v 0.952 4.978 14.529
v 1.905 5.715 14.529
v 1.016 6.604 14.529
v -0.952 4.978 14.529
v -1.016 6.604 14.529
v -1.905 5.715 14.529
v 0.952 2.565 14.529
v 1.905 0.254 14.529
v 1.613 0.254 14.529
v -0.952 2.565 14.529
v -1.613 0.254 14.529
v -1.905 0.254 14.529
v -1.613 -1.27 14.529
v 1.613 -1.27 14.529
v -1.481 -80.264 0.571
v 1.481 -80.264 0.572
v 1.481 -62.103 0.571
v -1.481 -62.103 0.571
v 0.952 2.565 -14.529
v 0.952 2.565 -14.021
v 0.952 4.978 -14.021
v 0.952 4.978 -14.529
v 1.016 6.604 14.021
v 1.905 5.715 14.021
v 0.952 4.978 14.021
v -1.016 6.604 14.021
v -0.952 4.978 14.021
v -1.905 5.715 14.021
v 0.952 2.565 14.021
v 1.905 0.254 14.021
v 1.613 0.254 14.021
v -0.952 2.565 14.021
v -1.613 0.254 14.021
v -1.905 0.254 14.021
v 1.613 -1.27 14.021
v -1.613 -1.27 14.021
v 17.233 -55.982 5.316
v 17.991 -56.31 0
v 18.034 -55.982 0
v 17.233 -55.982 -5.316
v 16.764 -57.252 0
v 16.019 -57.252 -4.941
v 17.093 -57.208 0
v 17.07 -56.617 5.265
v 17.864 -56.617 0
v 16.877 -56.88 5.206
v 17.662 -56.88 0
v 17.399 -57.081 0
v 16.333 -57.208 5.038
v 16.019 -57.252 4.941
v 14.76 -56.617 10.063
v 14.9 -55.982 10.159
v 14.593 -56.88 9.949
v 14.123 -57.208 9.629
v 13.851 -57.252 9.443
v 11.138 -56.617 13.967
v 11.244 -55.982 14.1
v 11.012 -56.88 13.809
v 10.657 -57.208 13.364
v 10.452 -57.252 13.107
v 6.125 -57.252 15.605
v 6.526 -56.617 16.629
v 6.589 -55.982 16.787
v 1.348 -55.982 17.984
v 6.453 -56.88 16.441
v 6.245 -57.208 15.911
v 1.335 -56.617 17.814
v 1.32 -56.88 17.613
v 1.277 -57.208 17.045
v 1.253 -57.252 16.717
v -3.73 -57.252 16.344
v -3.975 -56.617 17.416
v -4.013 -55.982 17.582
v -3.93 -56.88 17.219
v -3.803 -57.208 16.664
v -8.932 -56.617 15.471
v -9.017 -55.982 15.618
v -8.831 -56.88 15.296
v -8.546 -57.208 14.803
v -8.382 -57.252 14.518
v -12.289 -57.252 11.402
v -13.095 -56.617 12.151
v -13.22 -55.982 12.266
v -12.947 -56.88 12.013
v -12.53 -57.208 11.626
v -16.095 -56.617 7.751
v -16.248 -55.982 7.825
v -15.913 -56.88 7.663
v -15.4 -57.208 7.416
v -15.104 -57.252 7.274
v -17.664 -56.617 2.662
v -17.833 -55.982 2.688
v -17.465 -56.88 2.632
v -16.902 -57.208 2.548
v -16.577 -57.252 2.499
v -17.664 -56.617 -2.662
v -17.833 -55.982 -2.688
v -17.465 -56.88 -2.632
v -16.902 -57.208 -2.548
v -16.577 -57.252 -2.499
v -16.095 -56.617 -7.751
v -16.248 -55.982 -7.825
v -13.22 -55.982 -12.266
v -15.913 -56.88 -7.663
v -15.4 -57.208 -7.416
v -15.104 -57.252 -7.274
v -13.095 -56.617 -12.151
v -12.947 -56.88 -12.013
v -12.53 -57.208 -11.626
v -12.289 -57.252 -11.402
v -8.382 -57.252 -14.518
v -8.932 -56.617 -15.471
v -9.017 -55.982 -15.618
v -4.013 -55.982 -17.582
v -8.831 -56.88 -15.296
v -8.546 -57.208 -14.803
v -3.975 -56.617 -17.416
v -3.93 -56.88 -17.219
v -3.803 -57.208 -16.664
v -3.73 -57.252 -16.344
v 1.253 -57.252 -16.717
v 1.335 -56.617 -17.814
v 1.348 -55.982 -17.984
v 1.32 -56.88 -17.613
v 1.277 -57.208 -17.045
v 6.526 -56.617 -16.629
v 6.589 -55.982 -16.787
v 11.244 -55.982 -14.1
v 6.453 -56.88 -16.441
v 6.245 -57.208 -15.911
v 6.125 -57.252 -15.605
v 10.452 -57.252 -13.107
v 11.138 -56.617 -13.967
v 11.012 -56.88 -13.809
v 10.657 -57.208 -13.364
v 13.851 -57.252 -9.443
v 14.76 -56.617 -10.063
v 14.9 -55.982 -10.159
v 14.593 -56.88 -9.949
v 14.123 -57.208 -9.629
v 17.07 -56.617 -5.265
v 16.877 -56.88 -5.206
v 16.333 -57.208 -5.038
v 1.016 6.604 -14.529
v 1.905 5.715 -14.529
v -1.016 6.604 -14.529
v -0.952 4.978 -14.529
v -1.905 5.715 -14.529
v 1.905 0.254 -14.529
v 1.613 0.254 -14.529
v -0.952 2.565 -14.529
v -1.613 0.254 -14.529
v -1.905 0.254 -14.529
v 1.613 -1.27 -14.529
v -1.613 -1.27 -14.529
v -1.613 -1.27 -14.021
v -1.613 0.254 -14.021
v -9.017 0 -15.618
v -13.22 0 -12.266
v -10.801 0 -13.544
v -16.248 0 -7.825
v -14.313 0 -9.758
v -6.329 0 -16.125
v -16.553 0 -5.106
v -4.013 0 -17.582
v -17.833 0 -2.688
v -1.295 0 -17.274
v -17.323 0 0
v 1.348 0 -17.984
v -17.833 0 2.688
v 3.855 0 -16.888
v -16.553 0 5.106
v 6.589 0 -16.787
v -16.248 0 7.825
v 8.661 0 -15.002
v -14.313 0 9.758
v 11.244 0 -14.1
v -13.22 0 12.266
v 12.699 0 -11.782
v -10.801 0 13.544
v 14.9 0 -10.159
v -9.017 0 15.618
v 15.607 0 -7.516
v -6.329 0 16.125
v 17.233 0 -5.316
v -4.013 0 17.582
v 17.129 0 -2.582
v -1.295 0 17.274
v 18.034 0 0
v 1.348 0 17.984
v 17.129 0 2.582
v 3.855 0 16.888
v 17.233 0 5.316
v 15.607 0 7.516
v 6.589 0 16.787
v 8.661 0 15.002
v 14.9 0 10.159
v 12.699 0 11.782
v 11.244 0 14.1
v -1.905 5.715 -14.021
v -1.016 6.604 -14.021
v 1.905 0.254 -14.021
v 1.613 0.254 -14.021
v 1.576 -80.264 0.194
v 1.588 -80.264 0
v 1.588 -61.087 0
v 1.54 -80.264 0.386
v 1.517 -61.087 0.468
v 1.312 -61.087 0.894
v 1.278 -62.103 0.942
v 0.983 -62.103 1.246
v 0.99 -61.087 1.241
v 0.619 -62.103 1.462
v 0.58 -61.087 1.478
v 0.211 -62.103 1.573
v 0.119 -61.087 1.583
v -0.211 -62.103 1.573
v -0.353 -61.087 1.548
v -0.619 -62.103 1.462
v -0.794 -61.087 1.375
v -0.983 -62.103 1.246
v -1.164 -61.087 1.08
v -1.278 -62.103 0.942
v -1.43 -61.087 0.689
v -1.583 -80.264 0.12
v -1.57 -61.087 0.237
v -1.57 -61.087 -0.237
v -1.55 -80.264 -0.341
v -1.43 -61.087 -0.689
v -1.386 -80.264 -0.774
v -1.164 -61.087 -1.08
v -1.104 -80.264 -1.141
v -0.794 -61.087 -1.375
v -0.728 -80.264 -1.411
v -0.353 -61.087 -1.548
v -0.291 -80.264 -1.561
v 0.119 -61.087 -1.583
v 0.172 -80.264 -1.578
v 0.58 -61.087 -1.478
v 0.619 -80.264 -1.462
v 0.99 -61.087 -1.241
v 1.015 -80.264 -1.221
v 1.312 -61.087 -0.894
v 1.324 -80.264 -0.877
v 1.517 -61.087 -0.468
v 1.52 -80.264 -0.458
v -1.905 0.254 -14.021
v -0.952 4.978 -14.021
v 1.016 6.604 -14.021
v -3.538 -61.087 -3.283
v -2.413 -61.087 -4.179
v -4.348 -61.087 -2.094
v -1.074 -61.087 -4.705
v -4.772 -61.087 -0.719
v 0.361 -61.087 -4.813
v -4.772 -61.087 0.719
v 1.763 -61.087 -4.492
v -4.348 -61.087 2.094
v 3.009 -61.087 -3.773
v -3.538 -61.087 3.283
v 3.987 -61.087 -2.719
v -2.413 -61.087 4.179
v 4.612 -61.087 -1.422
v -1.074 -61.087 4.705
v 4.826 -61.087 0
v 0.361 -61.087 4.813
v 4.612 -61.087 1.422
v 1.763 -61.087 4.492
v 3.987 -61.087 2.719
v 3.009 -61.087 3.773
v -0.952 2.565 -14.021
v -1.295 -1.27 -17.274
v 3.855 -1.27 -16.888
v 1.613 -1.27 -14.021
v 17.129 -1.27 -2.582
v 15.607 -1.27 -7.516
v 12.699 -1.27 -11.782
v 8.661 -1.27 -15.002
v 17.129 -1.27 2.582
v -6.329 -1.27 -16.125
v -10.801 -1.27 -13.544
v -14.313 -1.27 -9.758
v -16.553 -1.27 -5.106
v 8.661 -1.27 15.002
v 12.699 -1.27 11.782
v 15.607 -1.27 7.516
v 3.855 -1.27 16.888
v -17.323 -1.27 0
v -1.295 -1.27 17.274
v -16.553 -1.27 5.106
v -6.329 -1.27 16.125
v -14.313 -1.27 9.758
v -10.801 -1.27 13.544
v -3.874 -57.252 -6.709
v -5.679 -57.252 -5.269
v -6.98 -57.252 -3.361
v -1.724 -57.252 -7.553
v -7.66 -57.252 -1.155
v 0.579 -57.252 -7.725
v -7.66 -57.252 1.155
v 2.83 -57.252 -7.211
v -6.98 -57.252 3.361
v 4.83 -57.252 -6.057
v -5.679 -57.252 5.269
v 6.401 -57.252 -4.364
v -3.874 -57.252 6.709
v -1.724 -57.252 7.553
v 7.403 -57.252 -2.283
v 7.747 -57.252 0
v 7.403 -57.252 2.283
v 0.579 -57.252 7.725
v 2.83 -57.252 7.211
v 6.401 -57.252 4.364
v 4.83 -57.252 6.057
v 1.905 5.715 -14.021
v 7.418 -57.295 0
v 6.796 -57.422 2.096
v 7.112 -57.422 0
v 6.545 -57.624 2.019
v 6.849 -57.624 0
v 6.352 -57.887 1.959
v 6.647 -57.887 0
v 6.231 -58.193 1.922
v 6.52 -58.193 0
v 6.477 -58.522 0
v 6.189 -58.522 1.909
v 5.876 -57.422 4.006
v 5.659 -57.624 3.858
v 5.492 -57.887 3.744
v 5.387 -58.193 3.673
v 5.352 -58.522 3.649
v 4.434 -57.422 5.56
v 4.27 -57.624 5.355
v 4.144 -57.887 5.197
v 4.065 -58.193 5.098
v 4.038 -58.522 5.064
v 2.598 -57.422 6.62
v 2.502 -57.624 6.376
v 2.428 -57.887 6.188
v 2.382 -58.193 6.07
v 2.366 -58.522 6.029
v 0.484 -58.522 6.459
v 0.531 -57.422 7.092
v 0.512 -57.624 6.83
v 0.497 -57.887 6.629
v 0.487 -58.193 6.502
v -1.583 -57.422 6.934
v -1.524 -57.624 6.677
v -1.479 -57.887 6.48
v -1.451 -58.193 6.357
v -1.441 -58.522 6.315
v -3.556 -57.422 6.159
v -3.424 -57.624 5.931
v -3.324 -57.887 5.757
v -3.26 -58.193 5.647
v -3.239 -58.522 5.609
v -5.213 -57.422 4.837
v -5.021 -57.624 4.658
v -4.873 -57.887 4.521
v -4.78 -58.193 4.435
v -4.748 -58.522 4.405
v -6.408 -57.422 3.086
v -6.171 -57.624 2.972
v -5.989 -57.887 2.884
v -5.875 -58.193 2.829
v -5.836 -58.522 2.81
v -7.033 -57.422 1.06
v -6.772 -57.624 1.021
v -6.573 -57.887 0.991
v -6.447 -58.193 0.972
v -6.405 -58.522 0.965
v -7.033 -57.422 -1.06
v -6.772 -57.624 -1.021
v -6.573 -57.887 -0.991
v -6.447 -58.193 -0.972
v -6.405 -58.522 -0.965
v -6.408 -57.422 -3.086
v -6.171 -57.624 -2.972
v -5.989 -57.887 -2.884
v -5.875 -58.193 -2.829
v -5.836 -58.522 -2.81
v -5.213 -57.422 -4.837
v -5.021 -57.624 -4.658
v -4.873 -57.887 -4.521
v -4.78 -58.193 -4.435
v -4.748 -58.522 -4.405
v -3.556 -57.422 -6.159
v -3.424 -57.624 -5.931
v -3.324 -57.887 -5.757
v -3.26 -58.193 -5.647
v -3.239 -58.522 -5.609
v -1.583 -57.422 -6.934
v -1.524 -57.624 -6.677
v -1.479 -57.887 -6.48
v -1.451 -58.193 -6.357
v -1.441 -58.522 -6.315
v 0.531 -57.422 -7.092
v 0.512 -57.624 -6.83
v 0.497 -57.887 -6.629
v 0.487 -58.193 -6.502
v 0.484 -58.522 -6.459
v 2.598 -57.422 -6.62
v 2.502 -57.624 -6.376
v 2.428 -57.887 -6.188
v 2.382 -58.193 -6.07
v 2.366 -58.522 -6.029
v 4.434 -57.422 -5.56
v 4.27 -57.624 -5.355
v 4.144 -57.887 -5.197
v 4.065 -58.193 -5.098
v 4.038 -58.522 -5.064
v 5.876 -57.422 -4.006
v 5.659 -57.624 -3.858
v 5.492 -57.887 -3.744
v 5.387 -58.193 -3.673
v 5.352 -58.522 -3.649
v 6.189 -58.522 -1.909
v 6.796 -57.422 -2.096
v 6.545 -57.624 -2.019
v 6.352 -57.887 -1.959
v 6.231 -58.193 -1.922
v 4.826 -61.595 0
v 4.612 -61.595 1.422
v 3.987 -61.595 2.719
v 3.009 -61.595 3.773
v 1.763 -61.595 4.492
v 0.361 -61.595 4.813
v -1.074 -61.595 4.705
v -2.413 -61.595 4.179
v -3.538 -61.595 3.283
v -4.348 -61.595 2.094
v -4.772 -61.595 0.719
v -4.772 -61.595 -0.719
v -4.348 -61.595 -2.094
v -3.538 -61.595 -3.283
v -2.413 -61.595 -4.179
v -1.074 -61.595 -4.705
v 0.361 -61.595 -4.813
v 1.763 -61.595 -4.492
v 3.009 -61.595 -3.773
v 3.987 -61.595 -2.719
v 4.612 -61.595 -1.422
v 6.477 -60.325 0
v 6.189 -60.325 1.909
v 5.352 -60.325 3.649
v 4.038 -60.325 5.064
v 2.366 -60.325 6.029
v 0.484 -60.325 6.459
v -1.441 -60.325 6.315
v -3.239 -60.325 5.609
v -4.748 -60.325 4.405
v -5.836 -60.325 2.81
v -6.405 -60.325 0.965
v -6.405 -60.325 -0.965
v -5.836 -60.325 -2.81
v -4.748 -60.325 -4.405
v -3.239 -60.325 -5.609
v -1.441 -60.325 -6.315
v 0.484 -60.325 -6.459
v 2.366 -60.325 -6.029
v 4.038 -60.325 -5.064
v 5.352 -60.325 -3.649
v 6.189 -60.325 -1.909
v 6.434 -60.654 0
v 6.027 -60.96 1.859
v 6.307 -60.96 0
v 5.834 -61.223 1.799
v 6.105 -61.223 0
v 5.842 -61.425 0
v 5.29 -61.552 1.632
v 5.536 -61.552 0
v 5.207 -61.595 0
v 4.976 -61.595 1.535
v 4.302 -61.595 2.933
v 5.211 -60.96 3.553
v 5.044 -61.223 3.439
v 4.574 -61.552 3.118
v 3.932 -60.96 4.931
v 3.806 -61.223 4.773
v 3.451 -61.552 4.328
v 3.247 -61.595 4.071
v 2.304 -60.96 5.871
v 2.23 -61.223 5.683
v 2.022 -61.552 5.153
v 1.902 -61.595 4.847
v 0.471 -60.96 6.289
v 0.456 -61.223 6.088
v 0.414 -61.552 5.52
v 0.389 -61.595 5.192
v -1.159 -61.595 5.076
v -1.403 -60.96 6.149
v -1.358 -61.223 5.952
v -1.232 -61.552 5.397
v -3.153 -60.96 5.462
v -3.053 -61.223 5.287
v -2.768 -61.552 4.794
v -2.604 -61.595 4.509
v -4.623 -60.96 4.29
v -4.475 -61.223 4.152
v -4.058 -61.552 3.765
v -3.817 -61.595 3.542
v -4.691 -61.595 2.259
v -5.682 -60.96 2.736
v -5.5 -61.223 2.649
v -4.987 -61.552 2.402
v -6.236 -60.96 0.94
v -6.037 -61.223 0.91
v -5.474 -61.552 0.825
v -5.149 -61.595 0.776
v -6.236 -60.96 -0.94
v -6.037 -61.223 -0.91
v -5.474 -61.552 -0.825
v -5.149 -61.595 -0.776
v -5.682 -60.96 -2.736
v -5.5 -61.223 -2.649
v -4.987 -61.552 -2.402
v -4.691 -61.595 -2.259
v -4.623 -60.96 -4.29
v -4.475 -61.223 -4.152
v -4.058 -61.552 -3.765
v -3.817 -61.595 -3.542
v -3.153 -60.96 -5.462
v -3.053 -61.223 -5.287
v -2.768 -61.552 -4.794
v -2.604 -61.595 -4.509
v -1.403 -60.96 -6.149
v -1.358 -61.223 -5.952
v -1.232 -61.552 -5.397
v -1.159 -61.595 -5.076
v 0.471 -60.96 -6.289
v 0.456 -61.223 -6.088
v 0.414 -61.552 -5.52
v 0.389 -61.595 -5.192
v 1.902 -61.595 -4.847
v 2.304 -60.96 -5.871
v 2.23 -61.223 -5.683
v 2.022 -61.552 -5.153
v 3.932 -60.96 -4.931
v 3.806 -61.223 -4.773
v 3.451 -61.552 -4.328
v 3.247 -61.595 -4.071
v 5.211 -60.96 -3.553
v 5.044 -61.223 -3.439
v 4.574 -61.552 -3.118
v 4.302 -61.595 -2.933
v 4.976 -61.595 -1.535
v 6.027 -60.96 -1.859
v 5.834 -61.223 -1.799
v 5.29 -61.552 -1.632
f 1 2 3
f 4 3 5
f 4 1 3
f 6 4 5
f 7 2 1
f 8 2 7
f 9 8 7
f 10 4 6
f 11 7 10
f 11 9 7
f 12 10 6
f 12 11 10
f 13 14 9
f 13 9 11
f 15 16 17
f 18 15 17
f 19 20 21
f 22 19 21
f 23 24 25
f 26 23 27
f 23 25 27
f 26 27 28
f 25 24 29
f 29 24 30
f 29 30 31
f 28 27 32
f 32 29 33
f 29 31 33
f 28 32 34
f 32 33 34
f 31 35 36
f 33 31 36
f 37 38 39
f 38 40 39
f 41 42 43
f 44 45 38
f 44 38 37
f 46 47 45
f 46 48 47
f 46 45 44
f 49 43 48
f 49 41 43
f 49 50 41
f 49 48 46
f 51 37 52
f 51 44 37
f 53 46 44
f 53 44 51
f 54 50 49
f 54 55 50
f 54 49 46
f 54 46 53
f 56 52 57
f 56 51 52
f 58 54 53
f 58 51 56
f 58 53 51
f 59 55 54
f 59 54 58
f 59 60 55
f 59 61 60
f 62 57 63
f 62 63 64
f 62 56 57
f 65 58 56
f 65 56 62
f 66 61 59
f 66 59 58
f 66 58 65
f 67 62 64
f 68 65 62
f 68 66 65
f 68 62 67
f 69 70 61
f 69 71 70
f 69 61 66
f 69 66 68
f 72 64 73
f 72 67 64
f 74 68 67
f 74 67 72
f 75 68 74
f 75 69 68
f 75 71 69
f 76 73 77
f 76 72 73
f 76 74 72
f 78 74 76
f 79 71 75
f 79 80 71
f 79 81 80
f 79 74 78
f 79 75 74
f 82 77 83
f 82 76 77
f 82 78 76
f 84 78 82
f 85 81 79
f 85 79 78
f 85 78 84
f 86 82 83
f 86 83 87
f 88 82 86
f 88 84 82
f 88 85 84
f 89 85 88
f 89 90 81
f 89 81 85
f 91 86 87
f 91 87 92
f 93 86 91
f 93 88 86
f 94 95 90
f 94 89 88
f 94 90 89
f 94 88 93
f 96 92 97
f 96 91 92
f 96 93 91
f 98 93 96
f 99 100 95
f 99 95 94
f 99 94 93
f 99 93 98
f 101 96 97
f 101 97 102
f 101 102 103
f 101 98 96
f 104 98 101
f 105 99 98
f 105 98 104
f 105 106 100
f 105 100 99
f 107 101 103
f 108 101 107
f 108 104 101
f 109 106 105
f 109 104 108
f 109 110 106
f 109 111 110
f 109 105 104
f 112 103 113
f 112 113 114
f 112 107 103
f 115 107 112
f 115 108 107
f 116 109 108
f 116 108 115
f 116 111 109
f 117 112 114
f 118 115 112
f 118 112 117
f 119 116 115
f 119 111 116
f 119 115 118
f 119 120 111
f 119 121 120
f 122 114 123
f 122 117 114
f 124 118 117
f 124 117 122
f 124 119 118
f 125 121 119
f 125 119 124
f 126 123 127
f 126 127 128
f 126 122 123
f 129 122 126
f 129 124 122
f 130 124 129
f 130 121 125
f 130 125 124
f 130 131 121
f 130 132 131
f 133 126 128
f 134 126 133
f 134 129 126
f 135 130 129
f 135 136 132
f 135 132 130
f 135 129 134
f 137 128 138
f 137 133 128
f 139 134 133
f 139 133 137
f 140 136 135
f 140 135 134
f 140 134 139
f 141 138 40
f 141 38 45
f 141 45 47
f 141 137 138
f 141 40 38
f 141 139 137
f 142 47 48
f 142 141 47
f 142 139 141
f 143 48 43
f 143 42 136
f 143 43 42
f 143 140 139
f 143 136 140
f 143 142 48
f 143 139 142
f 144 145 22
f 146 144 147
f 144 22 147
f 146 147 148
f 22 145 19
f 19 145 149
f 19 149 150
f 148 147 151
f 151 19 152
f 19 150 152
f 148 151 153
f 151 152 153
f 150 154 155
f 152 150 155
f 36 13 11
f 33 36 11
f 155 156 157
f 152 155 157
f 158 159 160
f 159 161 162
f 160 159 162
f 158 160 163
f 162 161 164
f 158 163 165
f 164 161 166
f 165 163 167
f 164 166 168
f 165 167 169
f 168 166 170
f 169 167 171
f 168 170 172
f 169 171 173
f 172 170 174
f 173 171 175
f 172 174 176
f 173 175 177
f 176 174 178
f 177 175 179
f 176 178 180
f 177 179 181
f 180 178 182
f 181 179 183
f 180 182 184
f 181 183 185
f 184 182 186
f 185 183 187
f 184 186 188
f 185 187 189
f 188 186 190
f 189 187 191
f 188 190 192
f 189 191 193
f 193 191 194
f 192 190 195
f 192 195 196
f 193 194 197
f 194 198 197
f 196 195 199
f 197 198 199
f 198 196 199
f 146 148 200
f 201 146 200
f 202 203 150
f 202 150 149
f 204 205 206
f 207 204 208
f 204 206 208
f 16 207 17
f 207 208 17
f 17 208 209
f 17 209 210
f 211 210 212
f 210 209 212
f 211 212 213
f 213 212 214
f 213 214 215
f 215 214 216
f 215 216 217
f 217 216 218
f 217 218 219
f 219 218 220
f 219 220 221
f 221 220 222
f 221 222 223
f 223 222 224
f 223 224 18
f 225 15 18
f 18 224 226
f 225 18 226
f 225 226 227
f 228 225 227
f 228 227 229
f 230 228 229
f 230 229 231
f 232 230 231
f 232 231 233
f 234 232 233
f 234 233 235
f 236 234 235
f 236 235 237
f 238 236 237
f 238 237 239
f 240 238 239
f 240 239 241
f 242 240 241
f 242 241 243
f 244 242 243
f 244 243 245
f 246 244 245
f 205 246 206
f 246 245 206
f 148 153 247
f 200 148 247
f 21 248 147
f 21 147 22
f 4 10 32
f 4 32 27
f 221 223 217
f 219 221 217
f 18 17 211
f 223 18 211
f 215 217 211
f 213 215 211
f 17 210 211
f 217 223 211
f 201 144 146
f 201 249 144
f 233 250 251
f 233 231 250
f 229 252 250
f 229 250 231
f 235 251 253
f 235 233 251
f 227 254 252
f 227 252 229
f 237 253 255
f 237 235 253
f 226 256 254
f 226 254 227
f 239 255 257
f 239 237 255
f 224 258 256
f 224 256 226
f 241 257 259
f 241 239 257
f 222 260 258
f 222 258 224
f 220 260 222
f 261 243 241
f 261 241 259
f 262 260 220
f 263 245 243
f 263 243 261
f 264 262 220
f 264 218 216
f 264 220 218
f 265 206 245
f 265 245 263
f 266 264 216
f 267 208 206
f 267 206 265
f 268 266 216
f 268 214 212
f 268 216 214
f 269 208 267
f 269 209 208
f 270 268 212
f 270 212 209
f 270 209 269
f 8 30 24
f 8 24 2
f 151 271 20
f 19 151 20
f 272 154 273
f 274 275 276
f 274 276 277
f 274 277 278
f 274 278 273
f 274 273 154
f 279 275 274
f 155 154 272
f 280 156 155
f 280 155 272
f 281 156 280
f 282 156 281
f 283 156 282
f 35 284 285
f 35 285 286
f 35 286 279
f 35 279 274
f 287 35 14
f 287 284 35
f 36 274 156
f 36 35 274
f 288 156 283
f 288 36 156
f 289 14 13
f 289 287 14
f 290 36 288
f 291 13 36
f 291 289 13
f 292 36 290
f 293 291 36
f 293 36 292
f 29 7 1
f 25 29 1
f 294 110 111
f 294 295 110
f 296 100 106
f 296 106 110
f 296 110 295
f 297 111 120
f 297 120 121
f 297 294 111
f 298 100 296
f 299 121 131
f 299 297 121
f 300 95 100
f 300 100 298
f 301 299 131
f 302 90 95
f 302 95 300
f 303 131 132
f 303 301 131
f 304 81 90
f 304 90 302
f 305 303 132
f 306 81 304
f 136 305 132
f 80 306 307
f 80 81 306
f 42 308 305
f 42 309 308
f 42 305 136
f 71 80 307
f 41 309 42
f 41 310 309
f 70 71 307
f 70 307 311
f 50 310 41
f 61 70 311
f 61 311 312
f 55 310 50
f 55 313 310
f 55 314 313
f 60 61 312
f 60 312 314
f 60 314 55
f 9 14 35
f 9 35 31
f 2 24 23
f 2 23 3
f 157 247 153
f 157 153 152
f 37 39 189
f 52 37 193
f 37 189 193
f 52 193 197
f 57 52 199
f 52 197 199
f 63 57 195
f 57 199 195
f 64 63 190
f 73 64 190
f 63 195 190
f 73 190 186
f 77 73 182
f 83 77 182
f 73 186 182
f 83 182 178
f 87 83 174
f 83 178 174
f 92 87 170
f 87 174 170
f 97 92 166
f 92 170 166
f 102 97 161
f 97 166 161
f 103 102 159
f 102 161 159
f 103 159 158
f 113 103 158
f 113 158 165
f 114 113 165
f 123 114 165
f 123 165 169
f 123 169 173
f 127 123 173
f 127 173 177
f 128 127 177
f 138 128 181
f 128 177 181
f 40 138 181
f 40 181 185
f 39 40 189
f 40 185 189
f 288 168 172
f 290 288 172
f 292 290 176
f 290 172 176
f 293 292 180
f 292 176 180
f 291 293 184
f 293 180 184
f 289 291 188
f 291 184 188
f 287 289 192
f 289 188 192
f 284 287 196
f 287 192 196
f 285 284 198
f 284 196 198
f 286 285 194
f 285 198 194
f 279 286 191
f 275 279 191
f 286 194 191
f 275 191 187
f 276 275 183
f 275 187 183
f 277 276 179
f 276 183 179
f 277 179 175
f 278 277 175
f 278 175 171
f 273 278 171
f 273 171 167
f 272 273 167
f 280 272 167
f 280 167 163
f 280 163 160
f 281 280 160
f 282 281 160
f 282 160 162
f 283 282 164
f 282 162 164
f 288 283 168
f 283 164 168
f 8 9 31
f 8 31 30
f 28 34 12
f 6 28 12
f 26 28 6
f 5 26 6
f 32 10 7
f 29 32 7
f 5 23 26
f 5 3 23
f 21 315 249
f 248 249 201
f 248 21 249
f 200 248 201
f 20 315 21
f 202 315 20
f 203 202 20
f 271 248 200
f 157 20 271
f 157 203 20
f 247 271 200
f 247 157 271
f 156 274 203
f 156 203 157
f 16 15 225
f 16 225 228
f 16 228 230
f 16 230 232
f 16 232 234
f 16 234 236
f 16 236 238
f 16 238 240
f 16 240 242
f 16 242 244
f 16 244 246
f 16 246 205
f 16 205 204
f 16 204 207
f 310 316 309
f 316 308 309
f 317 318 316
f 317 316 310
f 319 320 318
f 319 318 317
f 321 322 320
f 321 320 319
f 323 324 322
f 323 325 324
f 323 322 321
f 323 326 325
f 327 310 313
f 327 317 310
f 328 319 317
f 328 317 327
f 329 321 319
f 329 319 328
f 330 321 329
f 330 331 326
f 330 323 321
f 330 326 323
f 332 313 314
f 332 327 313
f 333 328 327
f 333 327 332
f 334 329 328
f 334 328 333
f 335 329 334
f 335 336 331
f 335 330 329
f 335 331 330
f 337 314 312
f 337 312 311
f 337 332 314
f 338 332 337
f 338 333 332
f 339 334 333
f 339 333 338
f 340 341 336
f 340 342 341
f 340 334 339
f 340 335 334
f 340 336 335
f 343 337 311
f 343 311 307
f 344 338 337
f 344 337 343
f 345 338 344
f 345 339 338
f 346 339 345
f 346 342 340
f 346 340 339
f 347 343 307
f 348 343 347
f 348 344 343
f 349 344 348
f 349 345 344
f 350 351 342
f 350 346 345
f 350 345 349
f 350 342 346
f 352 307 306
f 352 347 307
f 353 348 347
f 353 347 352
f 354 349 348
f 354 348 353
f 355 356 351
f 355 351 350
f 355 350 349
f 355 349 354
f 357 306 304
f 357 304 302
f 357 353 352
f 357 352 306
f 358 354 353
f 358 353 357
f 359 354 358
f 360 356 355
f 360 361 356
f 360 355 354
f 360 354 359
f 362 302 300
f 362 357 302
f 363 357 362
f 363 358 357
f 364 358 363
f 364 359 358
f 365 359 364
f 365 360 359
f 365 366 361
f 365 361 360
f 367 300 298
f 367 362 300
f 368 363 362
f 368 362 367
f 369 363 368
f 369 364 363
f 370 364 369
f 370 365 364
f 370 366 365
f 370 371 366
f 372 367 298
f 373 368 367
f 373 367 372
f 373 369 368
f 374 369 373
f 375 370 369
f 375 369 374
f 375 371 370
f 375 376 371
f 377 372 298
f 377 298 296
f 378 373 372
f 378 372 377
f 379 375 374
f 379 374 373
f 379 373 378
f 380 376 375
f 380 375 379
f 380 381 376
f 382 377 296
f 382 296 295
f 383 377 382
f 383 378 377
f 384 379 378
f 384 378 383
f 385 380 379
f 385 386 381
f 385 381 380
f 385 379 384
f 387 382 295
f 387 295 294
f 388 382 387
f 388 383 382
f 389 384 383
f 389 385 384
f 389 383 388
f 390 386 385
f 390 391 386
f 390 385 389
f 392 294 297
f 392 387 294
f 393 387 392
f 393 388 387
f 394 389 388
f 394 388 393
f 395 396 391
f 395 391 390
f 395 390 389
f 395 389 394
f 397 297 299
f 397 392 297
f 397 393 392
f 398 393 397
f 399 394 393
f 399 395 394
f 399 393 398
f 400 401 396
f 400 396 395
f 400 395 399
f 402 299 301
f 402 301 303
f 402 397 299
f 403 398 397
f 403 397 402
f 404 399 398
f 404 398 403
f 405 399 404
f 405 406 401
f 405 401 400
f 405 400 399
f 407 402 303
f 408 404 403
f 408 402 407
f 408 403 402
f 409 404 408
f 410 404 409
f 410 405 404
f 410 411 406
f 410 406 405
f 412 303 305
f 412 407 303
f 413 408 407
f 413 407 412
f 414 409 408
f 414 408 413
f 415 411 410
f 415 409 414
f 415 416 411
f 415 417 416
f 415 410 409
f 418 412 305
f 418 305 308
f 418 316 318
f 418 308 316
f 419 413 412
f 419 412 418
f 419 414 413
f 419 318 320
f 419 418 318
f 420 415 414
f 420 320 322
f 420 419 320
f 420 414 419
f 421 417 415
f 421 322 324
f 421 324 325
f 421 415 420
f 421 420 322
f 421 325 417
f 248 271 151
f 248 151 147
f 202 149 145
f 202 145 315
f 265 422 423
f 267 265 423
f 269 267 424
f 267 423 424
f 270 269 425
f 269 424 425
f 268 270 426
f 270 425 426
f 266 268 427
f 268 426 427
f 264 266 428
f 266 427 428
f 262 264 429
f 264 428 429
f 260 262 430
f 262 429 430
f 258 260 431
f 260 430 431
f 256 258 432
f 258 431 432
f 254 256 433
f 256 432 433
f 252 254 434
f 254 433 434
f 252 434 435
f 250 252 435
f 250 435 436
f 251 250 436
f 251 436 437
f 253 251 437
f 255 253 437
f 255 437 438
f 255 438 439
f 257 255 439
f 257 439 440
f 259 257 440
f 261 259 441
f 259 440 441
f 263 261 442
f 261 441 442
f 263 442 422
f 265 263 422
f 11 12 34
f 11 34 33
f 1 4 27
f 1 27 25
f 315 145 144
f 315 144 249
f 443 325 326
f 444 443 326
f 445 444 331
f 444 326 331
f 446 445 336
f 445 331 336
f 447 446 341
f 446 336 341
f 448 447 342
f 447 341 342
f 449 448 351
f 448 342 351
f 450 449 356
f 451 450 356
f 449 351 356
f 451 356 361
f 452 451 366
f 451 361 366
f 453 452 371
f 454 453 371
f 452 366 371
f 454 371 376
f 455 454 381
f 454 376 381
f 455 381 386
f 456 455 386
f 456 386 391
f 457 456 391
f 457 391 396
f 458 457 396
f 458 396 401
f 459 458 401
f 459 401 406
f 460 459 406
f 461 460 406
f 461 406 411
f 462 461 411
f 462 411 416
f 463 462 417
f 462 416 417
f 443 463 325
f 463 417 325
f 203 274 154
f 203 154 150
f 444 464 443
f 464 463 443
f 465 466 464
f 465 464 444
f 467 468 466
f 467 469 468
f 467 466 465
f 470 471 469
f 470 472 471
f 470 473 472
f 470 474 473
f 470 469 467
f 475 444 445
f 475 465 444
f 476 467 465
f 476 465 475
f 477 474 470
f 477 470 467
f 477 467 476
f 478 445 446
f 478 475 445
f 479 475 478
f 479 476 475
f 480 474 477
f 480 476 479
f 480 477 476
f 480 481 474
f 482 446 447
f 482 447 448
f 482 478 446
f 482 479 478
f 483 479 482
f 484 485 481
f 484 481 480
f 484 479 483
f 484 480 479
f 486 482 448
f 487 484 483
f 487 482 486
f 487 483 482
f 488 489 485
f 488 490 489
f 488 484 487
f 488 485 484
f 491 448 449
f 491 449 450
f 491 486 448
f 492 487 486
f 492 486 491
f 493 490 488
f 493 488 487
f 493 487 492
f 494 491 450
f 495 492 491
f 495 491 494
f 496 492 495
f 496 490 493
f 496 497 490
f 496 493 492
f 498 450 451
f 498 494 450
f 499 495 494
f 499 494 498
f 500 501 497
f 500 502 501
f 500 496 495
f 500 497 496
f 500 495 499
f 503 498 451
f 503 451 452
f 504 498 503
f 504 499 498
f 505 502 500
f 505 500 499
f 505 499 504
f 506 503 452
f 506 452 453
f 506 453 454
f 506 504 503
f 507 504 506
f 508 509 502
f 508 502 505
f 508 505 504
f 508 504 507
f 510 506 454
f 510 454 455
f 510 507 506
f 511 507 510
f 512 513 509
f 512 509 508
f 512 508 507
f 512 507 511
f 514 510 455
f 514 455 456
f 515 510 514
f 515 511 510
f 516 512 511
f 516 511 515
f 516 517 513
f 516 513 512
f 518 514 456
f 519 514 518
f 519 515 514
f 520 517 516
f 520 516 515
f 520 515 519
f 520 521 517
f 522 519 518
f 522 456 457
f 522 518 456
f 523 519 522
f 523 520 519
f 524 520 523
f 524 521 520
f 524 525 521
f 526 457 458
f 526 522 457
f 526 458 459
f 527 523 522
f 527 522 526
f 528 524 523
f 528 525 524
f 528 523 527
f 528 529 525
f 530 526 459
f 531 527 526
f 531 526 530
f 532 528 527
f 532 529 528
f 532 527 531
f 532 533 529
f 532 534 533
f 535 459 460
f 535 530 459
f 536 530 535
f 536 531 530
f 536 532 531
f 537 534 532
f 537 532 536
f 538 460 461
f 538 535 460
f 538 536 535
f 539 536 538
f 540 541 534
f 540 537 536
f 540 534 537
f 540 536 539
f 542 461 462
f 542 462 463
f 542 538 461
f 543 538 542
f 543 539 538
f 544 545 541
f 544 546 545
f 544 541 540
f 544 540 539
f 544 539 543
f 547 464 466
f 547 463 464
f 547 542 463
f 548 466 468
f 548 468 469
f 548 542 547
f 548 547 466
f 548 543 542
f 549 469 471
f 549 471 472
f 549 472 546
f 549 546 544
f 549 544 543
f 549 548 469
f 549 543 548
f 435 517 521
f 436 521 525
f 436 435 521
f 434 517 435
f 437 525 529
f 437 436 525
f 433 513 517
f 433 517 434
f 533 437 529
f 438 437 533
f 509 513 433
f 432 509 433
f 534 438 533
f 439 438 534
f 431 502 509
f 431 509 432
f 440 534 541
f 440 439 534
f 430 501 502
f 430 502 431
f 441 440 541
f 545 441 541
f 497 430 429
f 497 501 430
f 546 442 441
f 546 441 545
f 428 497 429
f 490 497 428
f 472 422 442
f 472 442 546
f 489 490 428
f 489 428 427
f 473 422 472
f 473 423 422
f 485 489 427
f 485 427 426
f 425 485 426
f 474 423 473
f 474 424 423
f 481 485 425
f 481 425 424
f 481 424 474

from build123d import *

# Parameters (mm, degrees)
F0_R      = 18.034
F1_DEPTH  = 57.2516
F2_R      = 6.477
F3_DEPTH  = 4.3434
F4_R      = 1.27
F5_R      = 4.826
F6_DEPTH  = 0.508
F7_R      = 1.5875
F8_DEPTH  = 19.177
F9_W      = 18.161
F9_H      = 1.016
F10_DEPTH = 3.175
F11_R     = 17.3228
F12_DEPTH = 1.27
F13_W     = 3.81
F13_H     = 0.508
F14_DEPTH = 7.874
F16_SIZE  = 0.889
F17_R     = 1.27
F18_W     = 0.2921
F18_H     = 1.524
F18_W_2   = 1.905
F18_H_2   = 2.413
F19_DEPTH = 29.0957


with BuildPart() as f1:
    # F0 (on Front) → F1 (new body)
    with BuildSketch(Plane.XZ):
        Circle(F0_R)
    extrude(amount=F1_DEPTH)

    # F2 (on face) → F3 (join)
    with BuildSketch(Plane.XZ.offset(57.2516)):
        Circle(F2_R)
    extrude(amount=F3_DEPTH)

    # F4
    f4_edges = [f1.edges().sort_by_distance(p)[0] for p in [
        (-6.477, -57.2516, 0),
        (-6.477, -61.595, 0),
    ]]
    fillet(f4_edges, radius=F4_R)

    # F5 (on face) → F6 (cut)
    with BuildSketch(Plane.XZ.offset(61.595)):
        Circle(F5_R)
    extrude(amount=-F6_DEPTH, mode=Mode.SUBTRACT)

    # F7 (on face) → F8 (join)
    with BuildSketch(Plane.XZ.offset(61.087)):
        Circle(F7_R)
    extrude(amount=F8_DEPTH)

    # F9 (on Right) → F10 (cut, symmetric)
    with BuildSketch(Plane.YZ):
        with Locations((-71.1835, 1.0795)):
            Rectangle(F9_W, F9_H)
    extrude(amount=F10_DEPTH, both=True, mode=Mode.SUBTRACT)

    # F11 (on face) → F12 (cut)
    with BuildSketch(Plane(origin=(0, 0, 0), x_dir=(-1, 0, 0), z_dir=(0, 1, 0))):
        Circle(F11_R)
    extrude(amount=-F12_DEPTH, mode=Mode.SUBTRACT)

    # F13 (on face) → F14 (join)
    with BuildSketch(Plane(origin=(0, -1.27, 0), x_dir=(-1, 0, 0), z_dir=(0, 1, 0))):
        with Locations((0, 14.2748)):
            Rectangle(F13_W, F13_H)
        with Locations((0, -14.2748)):
            Rectangle(F13_W, F13_H)
    extrude(amount=F14_DEPTH)

    # F16
    f16_edges = [f1.edges().sort_by_distance(p)[0] for p in [
        (-1.905, 6.604, 14.2748),
        (1.905, 6.604, 14.2748),
        (-1.905, 6.604, -14.2748),
        (1.905, 6.604, -14.2748),
    ]]
    chamfer(f16_edges, length=F16_SIZE)

    # F17
    f17_edges = [f1.edges().sort_by_distance(p)[0] for p in [
        (-18.034, -57.2516, 0),
    ]]
    fillet(f17_edges, radius=F17_R)

    # F18 (on face) → F19 (cut)
    with BuildSketch(Plane.XY.offset(14.5288)):
        with Locations((-1.75895, -0.508)):
            Rectangle(F18_W, F18_H)
        with Locations((1.75895, -0.508)):
            Rectangle(F18_W, F18_H)
        with Locations((0, 3.7719)):
            Rectangle(F18_W_2, F18_H_2)
    extrude(amount=-F19_DEPTH, mode=Mode.SUBTRACT)


solid = f1.part
